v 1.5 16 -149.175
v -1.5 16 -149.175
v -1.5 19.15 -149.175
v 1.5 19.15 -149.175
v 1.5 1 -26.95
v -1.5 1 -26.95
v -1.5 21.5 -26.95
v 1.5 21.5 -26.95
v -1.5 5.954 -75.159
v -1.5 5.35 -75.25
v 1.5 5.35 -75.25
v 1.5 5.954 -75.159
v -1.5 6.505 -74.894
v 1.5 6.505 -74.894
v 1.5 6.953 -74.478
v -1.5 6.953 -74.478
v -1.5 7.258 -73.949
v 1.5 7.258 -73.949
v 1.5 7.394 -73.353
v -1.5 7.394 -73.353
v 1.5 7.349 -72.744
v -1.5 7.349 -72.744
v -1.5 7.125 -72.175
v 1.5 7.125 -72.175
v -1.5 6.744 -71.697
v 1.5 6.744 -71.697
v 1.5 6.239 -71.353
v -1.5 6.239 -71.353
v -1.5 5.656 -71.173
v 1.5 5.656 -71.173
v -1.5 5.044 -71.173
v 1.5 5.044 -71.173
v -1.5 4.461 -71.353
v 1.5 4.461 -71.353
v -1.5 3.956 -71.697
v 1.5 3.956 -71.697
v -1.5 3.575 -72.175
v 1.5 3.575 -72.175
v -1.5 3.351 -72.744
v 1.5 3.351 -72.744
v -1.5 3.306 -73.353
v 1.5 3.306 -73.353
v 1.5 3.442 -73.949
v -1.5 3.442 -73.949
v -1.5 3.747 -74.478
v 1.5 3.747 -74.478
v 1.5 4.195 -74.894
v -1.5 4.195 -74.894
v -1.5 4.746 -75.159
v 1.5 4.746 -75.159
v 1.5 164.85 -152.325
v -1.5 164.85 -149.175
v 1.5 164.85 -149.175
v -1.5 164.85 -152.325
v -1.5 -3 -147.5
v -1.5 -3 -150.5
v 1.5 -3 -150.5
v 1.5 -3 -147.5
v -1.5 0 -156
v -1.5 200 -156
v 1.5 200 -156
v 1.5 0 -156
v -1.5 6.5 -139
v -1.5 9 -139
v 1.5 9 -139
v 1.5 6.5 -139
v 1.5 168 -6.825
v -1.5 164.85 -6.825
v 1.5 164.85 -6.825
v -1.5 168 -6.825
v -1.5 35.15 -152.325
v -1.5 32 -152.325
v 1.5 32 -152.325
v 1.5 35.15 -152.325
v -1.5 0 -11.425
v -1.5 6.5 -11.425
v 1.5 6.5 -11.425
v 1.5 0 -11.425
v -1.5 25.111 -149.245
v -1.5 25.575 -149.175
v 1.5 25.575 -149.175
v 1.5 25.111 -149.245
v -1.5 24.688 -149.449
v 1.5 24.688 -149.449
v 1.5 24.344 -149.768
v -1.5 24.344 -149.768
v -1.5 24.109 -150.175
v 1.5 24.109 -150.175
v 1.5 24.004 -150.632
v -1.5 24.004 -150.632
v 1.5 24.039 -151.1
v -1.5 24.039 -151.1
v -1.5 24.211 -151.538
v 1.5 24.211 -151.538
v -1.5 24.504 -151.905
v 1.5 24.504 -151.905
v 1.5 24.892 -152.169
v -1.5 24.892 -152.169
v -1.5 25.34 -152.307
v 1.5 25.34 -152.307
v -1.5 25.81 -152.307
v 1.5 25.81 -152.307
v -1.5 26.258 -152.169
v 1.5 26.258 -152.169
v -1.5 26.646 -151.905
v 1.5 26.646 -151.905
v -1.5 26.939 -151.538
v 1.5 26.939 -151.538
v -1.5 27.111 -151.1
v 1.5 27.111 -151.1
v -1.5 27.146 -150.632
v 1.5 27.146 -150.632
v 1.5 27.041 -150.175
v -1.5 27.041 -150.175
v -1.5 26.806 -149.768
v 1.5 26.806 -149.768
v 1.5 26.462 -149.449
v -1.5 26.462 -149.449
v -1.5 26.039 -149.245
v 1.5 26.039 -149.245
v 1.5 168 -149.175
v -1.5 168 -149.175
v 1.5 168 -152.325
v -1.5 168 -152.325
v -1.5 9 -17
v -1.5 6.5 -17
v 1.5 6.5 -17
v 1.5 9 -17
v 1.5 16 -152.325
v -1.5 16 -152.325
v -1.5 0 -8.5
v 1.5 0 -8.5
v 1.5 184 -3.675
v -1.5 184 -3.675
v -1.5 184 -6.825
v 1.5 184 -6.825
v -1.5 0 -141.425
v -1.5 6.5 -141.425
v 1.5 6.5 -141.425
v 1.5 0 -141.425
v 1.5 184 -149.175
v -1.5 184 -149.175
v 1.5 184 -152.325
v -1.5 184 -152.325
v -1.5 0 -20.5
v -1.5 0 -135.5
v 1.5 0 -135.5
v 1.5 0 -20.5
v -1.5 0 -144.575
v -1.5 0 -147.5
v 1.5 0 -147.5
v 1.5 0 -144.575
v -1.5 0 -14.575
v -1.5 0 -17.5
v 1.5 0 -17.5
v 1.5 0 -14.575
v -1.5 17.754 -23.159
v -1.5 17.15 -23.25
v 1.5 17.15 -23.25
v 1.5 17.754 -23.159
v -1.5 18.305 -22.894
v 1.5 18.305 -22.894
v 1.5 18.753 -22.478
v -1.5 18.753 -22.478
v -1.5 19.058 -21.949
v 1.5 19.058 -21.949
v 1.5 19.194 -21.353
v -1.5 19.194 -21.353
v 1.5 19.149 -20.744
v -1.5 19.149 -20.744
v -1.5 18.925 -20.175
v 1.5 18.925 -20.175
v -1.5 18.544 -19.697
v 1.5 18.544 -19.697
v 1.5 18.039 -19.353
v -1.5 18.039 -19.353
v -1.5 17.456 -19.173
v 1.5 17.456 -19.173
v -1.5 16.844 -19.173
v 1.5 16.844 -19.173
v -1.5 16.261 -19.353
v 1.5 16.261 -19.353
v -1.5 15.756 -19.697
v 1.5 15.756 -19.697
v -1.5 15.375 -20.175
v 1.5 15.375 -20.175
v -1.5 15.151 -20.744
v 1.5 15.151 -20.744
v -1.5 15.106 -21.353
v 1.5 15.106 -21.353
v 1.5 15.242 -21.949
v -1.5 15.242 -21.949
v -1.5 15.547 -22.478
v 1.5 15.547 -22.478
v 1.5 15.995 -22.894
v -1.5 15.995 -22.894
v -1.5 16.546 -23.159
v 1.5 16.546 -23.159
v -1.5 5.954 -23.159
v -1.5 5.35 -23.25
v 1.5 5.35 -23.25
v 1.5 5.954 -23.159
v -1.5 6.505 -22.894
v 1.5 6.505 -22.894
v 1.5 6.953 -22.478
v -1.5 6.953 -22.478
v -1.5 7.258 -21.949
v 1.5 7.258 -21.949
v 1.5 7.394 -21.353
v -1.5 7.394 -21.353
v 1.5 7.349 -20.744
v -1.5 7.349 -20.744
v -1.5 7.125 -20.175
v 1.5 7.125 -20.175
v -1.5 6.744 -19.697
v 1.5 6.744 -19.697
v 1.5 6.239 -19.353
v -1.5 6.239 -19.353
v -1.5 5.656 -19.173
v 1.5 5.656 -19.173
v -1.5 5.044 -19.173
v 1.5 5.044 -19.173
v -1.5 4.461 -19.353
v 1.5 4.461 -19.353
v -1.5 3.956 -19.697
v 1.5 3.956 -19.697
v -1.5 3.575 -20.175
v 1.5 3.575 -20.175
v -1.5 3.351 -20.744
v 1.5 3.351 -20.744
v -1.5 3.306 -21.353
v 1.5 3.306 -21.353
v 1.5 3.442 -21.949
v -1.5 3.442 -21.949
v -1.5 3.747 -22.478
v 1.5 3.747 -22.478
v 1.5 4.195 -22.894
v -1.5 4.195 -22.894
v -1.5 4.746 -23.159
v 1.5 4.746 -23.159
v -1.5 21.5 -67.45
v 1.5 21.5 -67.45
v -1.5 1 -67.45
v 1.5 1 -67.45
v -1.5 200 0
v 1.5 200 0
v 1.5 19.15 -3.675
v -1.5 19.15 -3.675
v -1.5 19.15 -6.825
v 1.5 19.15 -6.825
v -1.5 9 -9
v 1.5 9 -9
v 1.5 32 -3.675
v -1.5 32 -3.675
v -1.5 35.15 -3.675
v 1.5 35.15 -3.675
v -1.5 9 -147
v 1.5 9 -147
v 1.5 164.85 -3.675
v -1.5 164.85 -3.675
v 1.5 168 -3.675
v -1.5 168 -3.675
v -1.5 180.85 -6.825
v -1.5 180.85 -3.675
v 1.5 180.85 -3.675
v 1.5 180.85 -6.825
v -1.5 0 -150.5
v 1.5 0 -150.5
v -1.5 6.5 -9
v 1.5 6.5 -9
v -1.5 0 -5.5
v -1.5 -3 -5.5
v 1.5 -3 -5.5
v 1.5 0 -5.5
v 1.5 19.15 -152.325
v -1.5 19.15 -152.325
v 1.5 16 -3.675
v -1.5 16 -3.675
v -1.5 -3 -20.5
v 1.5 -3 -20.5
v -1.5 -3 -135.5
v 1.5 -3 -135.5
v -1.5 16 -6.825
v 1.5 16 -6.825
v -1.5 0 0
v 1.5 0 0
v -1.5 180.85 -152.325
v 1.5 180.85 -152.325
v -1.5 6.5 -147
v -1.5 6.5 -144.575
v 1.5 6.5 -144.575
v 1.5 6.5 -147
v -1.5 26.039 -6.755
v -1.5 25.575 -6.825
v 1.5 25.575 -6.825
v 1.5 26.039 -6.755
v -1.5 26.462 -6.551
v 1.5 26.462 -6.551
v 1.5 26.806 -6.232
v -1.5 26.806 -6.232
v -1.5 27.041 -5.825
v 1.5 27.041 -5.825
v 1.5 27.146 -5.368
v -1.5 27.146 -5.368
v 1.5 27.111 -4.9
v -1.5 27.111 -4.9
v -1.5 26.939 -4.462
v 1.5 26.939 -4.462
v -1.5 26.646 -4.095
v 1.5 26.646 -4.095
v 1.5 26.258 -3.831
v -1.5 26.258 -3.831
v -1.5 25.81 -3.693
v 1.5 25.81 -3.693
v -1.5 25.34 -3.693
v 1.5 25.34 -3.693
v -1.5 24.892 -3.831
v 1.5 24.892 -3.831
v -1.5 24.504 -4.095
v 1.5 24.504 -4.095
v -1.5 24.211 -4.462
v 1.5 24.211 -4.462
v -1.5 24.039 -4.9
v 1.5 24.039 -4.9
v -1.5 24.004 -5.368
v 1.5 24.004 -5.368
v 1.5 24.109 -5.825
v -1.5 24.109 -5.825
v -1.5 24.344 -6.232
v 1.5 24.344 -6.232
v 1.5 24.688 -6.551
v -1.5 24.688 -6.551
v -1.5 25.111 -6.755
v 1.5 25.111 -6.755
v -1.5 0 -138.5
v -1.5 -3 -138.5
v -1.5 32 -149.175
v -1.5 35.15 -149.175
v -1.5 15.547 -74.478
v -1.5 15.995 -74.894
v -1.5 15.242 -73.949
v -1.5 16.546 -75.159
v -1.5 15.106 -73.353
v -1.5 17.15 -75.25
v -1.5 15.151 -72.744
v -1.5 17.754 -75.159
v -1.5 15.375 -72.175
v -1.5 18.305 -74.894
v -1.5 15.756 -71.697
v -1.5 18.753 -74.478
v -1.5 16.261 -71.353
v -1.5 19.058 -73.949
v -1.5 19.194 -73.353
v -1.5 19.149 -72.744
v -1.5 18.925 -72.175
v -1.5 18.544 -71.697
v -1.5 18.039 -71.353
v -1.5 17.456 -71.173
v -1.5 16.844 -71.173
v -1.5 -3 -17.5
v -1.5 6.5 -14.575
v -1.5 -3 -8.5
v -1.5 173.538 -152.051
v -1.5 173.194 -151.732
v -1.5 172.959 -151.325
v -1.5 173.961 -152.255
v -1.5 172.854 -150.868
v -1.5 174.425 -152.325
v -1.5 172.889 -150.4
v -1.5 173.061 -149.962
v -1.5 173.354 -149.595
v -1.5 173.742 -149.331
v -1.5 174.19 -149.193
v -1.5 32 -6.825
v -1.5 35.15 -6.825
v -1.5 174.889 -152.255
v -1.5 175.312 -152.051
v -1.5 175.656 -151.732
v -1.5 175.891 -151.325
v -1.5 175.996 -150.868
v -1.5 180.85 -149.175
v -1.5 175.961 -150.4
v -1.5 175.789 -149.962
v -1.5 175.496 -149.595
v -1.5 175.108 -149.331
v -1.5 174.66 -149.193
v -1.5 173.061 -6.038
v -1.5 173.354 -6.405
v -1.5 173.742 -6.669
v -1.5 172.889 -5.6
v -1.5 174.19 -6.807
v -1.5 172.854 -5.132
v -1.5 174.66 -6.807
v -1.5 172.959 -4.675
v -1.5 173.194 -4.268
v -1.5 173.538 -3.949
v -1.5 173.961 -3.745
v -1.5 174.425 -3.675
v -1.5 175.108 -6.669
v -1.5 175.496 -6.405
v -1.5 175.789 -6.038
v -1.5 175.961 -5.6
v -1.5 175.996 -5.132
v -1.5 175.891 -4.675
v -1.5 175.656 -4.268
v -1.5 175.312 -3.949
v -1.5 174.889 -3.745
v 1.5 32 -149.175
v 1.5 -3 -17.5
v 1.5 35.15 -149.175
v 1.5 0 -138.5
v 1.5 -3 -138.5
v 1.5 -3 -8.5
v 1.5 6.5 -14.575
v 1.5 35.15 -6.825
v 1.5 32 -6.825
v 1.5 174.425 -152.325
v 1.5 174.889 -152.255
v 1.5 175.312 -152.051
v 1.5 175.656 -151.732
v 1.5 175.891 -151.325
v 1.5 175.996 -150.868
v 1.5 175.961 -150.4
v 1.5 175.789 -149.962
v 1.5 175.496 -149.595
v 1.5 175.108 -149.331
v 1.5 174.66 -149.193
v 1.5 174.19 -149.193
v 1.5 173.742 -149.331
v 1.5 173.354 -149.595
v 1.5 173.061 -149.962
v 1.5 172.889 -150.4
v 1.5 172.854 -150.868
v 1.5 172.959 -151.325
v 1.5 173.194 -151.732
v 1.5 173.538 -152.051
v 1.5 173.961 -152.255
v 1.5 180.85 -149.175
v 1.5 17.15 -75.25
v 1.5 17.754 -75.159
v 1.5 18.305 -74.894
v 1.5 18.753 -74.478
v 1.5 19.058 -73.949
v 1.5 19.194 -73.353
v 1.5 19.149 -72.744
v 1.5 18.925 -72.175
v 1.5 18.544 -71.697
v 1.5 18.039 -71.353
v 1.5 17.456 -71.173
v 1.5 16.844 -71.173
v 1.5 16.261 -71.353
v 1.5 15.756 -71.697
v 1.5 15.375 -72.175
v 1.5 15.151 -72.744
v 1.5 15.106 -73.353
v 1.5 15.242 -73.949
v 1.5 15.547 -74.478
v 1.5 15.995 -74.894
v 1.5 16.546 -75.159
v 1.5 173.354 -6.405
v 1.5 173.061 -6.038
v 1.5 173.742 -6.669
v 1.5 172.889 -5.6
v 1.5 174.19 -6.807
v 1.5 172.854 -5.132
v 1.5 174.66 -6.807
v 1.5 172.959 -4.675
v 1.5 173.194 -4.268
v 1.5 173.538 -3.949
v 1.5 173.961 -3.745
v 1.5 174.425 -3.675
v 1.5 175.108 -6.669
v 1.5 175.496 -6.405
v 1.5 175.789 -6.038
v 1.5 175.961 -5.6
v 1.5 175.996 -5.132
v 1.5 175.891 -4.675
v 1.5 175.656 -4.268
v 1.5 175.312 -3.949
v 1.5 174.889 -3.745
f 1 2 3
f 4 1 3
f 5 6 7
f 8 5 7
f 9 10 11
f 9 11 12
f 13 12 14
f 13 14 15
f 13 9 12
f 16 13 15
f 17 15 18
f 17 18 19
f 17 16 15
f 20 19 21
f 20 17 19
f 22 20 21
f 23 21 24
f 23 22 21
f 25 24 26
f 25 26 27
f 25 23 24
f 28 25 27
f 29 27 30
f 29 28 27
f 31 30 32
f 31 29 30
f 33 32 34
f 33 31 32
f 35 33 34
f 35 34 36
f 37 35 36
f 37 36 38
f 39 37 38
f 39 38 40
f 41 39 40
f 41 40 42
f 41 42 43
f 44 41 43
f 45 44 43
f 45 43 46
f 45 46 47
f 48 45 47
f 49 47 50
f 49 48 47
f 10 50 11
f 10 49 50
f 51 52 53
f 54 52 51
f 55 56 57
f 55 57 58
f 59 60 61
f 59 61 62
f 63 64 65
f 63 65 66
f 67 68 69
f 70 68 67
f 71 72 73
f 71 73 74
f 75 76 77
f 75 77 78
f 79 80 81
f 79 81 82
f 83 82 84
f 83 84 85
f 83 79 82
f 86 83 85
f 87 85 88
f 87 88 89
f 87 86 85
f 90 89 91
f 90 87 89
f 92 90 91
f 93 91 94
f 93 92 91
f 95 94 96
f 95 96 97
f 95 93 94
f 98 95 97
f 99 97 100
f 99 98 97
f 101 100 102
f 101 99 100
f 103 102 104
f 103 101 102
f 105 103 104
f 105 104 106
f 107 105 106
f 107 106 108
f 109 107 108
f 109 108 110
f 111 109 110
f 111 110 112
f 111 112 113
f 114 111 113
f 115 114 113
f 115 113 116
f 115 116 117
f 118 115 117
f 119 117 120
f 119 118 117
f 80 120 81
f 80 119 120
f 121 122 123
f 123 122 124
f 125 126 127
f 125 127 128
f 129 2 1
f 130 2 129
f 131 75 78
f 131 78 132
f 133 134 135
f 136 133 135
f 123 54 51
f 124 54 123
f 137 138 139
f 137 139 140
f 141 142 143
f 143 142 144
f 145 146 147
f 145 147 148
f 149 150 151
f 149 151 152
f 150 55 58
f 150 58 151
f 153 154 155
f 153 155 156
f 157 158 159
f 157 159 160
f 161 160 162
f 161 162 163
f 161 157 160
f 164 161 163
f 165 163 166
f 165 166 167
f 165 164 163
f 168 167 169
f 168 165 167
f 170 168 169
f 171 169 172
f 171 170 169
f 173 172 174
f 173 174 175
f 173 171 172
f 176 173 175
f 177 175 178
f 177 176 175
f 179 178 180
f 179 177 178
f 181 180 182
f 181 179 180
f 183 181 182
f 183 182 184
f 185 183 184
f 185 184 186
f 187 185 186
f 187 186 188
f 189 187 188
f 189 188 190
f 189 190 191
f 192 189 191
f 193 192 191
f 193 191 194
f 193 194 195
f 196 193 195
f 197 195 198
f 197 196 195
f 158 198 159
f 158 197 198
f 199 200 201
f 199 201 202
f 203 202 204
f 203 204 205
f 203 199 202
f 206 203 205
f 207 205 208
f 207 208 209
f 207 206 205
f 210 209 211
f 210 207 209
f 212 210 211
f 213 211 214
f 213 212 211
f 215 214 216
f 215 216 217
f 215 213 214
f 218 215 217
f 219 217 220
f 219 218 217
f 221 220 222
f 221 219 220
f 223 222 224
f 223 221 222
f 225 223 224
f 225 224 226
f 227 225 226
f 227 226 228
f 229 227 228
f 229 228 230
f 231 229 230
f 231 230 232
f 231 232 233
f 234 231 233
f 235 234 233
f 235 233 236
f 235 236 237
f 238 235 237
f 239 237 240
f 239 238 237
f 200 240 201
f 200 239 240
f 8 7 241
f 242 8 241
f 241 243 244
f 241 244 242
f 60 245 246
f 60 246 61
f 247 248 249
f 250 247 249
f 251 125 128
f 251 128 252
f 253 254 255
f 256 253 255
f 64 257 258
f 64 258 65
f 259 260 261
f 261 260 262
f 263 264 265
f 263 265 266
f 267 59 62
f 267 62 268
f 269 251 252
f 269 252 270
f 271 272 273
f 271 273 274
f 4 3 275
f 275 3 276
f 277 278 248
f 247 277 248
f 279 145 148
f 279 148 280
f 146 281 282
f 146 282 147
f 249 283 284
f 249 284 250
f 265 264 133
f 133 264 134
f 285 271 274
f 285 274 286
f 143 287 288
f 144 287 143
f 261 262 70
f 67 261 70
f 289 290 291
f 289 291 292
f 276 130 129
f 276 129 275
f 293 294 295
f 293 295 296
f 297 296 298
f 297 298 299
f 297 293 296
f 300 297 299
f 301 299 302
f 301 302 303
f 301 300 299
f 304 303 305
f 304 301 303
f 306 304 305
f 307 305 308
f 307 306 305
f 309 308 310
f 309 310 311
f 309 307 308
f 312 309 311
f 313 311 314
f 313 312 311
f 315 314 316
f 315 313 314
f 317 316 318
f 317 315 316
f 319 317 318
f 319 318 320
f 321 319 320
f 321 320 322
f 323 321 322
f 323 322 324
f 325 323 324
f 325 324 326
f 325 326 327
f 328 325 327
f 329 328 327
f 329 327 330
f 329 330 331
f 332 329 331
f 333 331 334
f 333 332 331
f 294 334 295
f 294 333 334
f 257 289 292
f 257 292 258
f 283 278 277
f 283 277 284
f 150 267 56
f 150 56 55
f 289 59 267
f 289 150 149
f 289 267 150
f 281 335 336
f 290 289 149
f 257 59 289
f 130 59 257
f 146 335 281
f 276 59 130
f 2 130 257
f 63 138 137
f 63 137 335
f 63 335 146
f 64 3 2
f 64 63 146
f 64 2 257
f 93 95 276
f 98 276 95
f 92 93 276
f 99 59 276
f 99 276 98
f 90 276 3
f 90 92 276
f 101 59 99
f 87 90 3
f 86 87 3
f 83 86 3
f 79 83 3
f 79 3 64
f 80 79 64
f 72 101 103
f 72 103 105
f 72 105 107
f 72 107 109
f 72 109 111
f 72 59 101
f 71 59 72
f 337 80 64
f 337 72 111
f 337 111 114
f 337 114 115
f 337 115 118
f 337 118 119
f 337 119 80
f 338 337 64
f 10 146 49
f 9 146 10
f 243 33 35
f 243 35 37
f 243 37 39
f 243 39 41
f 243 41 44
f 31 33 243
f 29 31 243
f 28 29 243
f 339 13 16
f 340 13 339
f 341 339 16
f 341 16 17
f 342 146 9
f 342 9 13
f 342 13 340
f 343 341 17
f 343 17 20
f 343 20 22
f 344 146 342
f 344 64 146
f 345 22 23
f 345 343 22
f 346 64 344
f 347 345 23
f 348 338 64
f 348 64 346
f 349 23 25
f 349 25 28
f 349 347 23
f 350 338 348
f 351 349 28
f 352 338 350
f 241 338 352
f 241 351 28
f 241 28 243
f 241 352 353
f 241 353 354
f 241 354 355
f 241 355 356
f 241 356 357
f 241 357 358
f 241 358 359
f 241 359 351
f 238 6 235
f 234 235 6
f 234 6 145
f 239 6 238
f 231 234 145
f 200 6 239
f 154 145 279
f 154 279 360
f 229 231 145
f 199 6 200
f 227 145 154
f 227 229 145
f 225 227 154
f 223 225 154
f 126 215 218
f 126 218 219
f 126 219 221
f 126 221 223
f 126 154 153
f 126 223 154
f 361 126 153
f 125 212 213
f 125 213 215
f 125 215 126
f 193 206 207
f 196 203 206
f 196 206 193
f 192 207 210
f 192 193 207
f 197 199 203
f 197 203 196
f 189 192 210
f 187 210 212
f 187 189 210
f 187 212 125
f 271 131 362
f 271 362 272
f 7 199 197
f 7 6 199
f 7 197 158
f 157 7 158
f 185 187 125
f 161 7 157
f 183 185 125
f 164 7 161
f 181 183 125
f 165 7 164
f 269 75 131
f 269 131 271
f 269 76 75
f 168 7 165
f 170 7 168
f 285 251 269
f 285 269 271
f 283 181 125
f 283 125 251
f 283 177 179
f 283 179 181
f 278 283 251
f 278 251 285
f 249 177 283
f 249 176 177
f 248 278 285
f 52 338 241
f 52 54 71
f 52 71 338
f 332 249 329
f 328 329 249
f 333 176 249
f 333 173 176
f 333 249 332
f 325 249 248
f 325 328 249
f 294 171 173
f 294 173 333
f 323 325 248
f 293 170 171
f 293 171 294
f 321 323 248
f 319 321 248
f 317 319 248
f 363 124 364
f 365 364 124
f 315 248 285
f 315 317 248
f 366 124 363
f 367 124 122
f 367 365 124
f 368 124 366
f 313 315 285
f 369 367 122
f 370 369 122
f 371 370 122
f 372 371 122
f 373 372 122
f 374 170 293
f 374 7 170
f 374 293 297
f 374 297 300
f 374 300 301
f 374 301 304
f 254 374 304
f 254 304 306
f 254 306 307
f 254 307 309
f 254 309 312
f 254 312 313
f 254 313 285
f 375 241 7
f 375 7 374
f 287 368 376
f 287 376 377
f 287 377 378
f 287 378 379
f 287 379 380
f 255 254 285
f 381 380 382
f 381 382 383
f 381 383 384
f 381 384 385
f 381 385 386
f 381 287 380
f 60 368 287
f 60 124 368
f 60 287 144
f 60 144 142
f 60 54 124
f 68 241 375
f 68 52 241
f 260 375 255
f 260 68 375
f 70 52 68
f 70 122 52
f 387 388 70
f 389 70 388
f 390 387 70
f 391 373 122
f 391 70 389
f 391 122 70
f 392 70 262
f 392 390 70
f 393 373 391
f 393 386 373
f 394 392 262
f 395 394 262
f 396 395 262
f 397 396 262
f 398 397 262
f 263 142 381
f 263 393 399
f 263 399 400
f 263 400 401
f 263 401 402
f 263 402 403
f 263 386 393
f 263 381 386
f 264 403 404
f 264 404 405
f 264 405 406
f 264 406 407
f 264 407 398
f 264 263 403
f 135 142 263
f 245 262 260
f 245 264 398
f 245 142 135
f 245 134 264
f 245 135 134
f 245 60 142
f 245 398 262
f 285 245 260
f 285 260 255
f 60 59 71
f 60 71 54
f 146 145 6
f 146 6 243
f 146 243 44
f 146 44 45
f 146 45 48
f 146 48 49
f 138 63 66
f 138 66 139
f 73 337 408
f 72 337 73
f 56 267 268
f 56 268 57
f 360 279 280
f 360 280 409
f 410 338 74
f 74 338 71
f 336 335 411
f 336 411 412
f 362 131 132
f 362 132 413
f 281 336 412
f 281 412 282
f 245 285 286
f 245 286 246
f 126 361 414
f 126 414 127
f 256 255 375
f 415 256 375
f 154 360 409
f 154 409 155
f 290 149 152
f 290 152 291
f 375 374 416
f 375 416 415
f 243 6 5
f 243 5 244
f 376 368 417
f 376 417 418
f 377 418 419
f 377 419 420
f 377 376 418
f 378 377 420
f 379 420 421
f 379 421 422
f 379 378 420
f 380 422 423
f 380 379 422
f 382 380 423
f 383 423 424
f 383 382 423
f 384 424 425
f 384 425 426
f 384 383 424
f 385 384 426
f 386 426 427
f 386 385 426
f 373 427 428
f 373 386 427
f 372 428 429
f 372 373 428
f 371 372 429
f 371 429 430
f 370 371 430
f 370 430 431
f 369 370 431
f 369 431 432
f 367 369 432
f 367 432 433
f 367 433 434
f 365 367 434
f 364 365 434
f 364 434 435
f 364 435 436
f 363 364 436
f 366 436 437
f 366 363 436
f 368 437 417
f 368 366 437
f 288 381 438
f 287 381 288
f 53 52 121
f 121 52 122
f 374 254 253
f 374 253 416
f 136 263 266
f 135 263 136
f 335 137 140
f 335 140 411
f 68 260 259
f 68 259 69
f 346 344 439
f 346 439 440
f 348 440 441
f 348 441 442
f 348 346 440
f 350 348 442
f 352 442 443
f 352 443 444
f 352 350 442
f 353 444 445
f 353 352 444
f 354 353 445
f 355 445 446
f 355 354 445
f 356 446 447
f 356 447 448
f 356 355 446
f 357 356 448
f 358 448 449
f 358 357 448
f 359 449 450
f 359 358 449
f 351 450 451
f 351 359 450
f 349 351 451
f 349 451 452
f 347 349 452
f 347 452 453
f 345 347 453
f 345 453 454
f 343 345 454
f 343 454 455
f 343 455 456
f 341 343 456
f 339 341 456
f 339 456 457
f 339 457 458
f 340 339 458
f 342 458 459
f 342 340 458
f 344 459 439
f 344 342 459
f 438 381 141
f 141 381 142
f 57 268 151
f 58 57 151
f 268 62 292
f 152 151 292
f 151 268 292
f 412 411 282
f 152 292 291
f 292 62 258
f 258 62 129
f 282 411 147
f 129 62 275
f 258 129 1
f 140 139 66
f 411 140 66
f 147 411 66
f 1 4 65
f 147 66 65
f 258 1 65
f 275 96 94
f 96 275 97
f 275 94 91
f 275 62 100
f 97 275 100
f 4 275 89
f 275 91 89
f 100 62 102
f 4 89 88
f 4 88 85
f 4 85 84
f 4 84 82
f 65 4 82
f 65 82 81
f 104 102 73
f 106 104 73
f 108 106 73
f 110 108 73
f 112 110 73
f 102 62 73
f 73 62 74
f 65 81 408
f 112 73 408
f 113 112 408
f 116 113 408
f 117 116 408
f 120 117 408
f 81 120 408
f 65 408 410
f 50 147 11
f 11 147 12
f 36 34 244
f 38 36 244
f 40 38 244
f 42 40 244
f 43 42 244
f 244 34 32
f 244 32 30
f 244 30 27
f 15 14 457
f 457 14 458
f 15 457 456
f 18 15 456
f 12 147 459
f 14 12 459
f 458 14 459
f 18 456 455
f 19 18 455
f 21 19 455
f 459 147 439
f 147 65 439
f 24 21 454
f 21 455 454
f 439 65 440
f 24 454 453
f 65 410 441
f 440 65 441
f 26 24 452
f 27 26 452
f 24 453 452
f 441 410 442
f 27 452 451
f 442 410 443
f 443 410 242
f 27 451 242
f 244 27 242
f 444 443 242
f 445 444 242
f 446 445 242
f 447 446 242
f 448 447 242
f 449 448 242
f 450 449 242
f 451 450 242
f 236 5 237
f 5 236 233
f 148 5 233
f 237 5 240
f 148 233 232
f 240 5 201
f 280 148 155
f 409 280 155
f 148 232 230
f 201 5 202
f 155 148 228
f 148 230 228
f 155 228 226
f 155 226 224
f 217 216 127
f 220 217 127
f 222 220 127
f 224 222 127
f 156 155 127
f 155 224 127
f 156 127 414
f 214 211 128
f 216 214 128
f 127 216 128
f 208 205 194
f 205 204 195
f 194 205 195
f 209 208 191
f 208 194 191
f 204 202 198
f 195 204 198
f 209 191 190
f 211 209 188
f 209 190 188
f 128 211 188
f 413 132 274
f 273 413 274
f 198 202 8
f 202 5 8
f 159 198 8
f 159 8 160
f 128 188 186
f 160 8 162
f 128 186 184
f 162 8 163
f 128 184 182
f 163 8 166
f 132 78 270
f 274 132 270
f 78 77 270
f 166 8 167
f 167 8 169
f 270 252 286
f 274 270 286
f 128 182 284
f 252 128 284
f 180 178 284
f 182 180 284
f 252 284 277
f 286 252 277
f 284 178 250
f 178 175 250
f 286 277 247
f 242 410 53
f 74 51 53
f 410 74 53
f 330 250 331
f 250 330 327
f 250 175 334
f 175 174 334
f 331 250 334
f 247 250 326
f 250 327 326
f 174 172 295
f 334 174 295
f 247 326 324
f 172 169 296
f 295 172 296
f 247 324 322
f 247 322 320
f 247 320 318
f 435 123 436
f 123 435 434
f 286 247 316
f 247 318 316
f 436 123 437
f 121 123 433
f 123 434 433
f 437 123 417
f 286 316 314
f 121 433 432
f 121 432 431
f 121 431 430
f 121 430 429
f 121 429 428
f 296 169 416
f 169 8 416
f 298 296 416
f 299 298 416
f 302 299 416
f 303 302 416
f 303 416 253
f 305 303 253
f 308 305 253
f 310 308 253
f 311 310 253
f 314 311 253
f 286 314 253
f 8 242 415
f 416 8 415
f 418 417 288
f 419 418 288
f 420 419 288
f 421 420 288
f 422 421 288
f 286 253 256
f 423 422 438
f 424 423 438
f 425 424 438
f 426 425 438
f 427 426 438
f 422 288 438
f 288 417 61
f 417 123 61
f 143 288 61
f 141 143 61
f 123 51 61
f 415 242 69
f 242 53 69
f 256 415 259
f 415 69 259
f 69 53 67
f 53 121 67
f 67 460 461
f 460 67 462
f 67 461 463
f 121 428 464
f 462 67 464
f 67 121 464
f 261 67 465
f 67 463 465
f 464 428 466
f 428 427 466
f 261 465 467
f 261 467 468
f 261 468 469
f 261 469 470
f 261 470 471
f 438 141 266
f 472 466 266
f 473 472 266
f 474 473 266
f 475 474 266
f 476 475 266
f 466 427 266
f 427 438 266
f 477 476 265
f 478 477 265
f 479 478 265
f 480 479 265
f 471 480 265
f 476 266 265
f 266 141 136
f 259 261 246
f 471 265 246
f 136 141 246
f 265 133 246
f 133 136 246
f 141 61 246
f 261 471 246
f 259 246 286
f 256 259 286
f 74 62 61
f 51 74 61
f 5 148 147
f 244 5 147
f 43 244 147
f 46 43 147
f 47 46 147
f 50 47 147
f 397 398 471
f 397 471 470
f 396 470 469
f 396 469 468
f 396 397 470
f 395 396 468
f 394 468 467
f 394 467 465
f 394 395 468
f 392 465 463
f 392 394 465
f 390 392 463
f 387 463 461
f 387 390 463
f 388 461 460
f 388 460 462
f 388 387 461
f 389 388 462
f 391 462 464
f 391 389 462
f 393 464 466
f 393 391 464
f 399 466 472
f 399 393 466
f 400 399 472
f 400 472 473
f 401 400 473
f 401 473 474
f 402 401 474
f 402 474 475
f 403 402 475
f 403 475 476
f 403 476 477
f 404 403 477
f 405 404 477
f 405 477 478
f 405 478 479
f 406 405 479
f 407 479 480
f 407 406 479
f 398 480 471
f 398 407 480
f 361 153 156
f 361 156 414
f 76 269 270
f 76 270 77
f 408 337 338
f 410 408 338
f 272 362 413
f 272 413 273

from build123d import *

# Parameters (mm, degrees)
BOSS_EXTRUDE2_DEPTH      = 1.5
BOSS_EXTRUDE2_DEPTH_BACK = 1.5
SKETCH1_R                = 1.575
SKETCH1_R_2              = 2.05
SKETCH1_W                = 40.5
SKETCH1_H                = 20.499999995
SKETCH1_W_2              = 3.15
SKETCH1_H_2              = 3.15


with BuildPart() as part:
    # Sketch1 → Boss-Extrude2 (new, two sides: drawn at the far end of the back side and taken through both)
    with BuildSketch(Plane(origin=(0, 0, 0), x_dir=(0, 0, -1), z_dir=(1, 0, 0)).offset(-BOSS_EXTRUDE2_DEPTH_BACK)):
        Polygon((11.425, 0), (8.5, 0), (8.5, -3), (5.5, -3), (5.5, 0), (0, 0), (0, 200), (156, 200), (156, 0), (150.5, 0), (150.5, -3), (147.5, -3), (147.5, 0), (144.575, 0), (144.575, 6.5), (147, 6.5), (147, 9), (139, 9), (139, 6.5), (141.425, 6.5), (141.425, 0), (138.5, 0), (138.5, -3), (135.5, -3), (135.5, 0), (20.5, 0), (20.5, -3), (17.5, -3), (17.5, 0), (14.575, 0), (14.575, 6.5), (17, 6.5), (17, 9), (9, 9), (9, 6.5), (11.425, 6.5), align=None)
        with Locations((5.25, 25.575)):
            Circle(SKETCH1_R, mode=Mode.SUBTRACT)
        with Locations((5.25, 174.425)):
            Circle(SKETCH1_R, mode=Mode.SUBTRACT)
        with Locations((150.75, 174.425)):
            Circle(SKETCH1_R, mode=Mode.SUBTRACT)
        with Locations((150.75, 25.575)):
            Circle(SKETCH1_R, mode=Mode.SUBTRACT)
        with Locations((73.2, 5.35)):
            Circle(SKETCH1_R_2, mode=Mode.SUBTRACT)
        with Locations((73.2, 17.149999995)):
            Circle(SKETCH1_R_2, mode=Mode.SUBTRACT)
        with Locations((21.2, 5.35)):
            Circle(SKETCH1_R_2, mode=Mode.SUBTRACT)
        with Locations((21.2, 17.149999995)):
            Circle(SKETCH1_R_2, mode=Mode.SUBTRACT)
        with Locations((47.2, 11.249999997)):
            Rectangle(SKETCH1_W, SKETCH1_H, mode=Mode.SUBTRACT)
        with Locations((5.25, 17.575)):
            Rectangle(SKETCH1_W_2, SKETCH1_H_2, mode=Mode.SUBTRACT)
        with Locations((5.25, 33.575)):
            Rectangle(SKETCH1_W_2, SKETCH1_H_2, mode=Mode.SUBTRACT)
        with Locations((5.25, 166.425)):
            Rectangle(SKETCH1_W_2, SKETCH1_H_2, mode=Mode.SUBTRACT)
        with Locations((5.25, 182.425)):
            Rectangle(SKETCH1_W_2, SKETCH1_H_2, mode=Mode.SUBTRACT)
        with Locations((150.75, 182.425)):
            Rectangle(SKETCH1_W_2, SKETCH1_H_2, mode=Mode.SUBTRACT)
        with Locations((150.75, 166.425)):
            Rectangle(SKETCH1_W_2, SKETCH1_H_2, mode=Mode.SUBTRACT)
        with Locations((150.75, 33.575)):
            Rectangle(SKETCH1_W_2, SKETCH1_H_2, mode=Mode.SUBTRACT)
        with Locations((150.75, 17.575)):
            Rectangle(SKETCH1_W_2, SKETCH1_H_2, mode=Mode.SUBTRACT)
    extrude(amount=BOSS_EXTRUDE2_DEPTH + BOSS_EXTRUDE2_DEPTH_BACK)


solid = part.part
